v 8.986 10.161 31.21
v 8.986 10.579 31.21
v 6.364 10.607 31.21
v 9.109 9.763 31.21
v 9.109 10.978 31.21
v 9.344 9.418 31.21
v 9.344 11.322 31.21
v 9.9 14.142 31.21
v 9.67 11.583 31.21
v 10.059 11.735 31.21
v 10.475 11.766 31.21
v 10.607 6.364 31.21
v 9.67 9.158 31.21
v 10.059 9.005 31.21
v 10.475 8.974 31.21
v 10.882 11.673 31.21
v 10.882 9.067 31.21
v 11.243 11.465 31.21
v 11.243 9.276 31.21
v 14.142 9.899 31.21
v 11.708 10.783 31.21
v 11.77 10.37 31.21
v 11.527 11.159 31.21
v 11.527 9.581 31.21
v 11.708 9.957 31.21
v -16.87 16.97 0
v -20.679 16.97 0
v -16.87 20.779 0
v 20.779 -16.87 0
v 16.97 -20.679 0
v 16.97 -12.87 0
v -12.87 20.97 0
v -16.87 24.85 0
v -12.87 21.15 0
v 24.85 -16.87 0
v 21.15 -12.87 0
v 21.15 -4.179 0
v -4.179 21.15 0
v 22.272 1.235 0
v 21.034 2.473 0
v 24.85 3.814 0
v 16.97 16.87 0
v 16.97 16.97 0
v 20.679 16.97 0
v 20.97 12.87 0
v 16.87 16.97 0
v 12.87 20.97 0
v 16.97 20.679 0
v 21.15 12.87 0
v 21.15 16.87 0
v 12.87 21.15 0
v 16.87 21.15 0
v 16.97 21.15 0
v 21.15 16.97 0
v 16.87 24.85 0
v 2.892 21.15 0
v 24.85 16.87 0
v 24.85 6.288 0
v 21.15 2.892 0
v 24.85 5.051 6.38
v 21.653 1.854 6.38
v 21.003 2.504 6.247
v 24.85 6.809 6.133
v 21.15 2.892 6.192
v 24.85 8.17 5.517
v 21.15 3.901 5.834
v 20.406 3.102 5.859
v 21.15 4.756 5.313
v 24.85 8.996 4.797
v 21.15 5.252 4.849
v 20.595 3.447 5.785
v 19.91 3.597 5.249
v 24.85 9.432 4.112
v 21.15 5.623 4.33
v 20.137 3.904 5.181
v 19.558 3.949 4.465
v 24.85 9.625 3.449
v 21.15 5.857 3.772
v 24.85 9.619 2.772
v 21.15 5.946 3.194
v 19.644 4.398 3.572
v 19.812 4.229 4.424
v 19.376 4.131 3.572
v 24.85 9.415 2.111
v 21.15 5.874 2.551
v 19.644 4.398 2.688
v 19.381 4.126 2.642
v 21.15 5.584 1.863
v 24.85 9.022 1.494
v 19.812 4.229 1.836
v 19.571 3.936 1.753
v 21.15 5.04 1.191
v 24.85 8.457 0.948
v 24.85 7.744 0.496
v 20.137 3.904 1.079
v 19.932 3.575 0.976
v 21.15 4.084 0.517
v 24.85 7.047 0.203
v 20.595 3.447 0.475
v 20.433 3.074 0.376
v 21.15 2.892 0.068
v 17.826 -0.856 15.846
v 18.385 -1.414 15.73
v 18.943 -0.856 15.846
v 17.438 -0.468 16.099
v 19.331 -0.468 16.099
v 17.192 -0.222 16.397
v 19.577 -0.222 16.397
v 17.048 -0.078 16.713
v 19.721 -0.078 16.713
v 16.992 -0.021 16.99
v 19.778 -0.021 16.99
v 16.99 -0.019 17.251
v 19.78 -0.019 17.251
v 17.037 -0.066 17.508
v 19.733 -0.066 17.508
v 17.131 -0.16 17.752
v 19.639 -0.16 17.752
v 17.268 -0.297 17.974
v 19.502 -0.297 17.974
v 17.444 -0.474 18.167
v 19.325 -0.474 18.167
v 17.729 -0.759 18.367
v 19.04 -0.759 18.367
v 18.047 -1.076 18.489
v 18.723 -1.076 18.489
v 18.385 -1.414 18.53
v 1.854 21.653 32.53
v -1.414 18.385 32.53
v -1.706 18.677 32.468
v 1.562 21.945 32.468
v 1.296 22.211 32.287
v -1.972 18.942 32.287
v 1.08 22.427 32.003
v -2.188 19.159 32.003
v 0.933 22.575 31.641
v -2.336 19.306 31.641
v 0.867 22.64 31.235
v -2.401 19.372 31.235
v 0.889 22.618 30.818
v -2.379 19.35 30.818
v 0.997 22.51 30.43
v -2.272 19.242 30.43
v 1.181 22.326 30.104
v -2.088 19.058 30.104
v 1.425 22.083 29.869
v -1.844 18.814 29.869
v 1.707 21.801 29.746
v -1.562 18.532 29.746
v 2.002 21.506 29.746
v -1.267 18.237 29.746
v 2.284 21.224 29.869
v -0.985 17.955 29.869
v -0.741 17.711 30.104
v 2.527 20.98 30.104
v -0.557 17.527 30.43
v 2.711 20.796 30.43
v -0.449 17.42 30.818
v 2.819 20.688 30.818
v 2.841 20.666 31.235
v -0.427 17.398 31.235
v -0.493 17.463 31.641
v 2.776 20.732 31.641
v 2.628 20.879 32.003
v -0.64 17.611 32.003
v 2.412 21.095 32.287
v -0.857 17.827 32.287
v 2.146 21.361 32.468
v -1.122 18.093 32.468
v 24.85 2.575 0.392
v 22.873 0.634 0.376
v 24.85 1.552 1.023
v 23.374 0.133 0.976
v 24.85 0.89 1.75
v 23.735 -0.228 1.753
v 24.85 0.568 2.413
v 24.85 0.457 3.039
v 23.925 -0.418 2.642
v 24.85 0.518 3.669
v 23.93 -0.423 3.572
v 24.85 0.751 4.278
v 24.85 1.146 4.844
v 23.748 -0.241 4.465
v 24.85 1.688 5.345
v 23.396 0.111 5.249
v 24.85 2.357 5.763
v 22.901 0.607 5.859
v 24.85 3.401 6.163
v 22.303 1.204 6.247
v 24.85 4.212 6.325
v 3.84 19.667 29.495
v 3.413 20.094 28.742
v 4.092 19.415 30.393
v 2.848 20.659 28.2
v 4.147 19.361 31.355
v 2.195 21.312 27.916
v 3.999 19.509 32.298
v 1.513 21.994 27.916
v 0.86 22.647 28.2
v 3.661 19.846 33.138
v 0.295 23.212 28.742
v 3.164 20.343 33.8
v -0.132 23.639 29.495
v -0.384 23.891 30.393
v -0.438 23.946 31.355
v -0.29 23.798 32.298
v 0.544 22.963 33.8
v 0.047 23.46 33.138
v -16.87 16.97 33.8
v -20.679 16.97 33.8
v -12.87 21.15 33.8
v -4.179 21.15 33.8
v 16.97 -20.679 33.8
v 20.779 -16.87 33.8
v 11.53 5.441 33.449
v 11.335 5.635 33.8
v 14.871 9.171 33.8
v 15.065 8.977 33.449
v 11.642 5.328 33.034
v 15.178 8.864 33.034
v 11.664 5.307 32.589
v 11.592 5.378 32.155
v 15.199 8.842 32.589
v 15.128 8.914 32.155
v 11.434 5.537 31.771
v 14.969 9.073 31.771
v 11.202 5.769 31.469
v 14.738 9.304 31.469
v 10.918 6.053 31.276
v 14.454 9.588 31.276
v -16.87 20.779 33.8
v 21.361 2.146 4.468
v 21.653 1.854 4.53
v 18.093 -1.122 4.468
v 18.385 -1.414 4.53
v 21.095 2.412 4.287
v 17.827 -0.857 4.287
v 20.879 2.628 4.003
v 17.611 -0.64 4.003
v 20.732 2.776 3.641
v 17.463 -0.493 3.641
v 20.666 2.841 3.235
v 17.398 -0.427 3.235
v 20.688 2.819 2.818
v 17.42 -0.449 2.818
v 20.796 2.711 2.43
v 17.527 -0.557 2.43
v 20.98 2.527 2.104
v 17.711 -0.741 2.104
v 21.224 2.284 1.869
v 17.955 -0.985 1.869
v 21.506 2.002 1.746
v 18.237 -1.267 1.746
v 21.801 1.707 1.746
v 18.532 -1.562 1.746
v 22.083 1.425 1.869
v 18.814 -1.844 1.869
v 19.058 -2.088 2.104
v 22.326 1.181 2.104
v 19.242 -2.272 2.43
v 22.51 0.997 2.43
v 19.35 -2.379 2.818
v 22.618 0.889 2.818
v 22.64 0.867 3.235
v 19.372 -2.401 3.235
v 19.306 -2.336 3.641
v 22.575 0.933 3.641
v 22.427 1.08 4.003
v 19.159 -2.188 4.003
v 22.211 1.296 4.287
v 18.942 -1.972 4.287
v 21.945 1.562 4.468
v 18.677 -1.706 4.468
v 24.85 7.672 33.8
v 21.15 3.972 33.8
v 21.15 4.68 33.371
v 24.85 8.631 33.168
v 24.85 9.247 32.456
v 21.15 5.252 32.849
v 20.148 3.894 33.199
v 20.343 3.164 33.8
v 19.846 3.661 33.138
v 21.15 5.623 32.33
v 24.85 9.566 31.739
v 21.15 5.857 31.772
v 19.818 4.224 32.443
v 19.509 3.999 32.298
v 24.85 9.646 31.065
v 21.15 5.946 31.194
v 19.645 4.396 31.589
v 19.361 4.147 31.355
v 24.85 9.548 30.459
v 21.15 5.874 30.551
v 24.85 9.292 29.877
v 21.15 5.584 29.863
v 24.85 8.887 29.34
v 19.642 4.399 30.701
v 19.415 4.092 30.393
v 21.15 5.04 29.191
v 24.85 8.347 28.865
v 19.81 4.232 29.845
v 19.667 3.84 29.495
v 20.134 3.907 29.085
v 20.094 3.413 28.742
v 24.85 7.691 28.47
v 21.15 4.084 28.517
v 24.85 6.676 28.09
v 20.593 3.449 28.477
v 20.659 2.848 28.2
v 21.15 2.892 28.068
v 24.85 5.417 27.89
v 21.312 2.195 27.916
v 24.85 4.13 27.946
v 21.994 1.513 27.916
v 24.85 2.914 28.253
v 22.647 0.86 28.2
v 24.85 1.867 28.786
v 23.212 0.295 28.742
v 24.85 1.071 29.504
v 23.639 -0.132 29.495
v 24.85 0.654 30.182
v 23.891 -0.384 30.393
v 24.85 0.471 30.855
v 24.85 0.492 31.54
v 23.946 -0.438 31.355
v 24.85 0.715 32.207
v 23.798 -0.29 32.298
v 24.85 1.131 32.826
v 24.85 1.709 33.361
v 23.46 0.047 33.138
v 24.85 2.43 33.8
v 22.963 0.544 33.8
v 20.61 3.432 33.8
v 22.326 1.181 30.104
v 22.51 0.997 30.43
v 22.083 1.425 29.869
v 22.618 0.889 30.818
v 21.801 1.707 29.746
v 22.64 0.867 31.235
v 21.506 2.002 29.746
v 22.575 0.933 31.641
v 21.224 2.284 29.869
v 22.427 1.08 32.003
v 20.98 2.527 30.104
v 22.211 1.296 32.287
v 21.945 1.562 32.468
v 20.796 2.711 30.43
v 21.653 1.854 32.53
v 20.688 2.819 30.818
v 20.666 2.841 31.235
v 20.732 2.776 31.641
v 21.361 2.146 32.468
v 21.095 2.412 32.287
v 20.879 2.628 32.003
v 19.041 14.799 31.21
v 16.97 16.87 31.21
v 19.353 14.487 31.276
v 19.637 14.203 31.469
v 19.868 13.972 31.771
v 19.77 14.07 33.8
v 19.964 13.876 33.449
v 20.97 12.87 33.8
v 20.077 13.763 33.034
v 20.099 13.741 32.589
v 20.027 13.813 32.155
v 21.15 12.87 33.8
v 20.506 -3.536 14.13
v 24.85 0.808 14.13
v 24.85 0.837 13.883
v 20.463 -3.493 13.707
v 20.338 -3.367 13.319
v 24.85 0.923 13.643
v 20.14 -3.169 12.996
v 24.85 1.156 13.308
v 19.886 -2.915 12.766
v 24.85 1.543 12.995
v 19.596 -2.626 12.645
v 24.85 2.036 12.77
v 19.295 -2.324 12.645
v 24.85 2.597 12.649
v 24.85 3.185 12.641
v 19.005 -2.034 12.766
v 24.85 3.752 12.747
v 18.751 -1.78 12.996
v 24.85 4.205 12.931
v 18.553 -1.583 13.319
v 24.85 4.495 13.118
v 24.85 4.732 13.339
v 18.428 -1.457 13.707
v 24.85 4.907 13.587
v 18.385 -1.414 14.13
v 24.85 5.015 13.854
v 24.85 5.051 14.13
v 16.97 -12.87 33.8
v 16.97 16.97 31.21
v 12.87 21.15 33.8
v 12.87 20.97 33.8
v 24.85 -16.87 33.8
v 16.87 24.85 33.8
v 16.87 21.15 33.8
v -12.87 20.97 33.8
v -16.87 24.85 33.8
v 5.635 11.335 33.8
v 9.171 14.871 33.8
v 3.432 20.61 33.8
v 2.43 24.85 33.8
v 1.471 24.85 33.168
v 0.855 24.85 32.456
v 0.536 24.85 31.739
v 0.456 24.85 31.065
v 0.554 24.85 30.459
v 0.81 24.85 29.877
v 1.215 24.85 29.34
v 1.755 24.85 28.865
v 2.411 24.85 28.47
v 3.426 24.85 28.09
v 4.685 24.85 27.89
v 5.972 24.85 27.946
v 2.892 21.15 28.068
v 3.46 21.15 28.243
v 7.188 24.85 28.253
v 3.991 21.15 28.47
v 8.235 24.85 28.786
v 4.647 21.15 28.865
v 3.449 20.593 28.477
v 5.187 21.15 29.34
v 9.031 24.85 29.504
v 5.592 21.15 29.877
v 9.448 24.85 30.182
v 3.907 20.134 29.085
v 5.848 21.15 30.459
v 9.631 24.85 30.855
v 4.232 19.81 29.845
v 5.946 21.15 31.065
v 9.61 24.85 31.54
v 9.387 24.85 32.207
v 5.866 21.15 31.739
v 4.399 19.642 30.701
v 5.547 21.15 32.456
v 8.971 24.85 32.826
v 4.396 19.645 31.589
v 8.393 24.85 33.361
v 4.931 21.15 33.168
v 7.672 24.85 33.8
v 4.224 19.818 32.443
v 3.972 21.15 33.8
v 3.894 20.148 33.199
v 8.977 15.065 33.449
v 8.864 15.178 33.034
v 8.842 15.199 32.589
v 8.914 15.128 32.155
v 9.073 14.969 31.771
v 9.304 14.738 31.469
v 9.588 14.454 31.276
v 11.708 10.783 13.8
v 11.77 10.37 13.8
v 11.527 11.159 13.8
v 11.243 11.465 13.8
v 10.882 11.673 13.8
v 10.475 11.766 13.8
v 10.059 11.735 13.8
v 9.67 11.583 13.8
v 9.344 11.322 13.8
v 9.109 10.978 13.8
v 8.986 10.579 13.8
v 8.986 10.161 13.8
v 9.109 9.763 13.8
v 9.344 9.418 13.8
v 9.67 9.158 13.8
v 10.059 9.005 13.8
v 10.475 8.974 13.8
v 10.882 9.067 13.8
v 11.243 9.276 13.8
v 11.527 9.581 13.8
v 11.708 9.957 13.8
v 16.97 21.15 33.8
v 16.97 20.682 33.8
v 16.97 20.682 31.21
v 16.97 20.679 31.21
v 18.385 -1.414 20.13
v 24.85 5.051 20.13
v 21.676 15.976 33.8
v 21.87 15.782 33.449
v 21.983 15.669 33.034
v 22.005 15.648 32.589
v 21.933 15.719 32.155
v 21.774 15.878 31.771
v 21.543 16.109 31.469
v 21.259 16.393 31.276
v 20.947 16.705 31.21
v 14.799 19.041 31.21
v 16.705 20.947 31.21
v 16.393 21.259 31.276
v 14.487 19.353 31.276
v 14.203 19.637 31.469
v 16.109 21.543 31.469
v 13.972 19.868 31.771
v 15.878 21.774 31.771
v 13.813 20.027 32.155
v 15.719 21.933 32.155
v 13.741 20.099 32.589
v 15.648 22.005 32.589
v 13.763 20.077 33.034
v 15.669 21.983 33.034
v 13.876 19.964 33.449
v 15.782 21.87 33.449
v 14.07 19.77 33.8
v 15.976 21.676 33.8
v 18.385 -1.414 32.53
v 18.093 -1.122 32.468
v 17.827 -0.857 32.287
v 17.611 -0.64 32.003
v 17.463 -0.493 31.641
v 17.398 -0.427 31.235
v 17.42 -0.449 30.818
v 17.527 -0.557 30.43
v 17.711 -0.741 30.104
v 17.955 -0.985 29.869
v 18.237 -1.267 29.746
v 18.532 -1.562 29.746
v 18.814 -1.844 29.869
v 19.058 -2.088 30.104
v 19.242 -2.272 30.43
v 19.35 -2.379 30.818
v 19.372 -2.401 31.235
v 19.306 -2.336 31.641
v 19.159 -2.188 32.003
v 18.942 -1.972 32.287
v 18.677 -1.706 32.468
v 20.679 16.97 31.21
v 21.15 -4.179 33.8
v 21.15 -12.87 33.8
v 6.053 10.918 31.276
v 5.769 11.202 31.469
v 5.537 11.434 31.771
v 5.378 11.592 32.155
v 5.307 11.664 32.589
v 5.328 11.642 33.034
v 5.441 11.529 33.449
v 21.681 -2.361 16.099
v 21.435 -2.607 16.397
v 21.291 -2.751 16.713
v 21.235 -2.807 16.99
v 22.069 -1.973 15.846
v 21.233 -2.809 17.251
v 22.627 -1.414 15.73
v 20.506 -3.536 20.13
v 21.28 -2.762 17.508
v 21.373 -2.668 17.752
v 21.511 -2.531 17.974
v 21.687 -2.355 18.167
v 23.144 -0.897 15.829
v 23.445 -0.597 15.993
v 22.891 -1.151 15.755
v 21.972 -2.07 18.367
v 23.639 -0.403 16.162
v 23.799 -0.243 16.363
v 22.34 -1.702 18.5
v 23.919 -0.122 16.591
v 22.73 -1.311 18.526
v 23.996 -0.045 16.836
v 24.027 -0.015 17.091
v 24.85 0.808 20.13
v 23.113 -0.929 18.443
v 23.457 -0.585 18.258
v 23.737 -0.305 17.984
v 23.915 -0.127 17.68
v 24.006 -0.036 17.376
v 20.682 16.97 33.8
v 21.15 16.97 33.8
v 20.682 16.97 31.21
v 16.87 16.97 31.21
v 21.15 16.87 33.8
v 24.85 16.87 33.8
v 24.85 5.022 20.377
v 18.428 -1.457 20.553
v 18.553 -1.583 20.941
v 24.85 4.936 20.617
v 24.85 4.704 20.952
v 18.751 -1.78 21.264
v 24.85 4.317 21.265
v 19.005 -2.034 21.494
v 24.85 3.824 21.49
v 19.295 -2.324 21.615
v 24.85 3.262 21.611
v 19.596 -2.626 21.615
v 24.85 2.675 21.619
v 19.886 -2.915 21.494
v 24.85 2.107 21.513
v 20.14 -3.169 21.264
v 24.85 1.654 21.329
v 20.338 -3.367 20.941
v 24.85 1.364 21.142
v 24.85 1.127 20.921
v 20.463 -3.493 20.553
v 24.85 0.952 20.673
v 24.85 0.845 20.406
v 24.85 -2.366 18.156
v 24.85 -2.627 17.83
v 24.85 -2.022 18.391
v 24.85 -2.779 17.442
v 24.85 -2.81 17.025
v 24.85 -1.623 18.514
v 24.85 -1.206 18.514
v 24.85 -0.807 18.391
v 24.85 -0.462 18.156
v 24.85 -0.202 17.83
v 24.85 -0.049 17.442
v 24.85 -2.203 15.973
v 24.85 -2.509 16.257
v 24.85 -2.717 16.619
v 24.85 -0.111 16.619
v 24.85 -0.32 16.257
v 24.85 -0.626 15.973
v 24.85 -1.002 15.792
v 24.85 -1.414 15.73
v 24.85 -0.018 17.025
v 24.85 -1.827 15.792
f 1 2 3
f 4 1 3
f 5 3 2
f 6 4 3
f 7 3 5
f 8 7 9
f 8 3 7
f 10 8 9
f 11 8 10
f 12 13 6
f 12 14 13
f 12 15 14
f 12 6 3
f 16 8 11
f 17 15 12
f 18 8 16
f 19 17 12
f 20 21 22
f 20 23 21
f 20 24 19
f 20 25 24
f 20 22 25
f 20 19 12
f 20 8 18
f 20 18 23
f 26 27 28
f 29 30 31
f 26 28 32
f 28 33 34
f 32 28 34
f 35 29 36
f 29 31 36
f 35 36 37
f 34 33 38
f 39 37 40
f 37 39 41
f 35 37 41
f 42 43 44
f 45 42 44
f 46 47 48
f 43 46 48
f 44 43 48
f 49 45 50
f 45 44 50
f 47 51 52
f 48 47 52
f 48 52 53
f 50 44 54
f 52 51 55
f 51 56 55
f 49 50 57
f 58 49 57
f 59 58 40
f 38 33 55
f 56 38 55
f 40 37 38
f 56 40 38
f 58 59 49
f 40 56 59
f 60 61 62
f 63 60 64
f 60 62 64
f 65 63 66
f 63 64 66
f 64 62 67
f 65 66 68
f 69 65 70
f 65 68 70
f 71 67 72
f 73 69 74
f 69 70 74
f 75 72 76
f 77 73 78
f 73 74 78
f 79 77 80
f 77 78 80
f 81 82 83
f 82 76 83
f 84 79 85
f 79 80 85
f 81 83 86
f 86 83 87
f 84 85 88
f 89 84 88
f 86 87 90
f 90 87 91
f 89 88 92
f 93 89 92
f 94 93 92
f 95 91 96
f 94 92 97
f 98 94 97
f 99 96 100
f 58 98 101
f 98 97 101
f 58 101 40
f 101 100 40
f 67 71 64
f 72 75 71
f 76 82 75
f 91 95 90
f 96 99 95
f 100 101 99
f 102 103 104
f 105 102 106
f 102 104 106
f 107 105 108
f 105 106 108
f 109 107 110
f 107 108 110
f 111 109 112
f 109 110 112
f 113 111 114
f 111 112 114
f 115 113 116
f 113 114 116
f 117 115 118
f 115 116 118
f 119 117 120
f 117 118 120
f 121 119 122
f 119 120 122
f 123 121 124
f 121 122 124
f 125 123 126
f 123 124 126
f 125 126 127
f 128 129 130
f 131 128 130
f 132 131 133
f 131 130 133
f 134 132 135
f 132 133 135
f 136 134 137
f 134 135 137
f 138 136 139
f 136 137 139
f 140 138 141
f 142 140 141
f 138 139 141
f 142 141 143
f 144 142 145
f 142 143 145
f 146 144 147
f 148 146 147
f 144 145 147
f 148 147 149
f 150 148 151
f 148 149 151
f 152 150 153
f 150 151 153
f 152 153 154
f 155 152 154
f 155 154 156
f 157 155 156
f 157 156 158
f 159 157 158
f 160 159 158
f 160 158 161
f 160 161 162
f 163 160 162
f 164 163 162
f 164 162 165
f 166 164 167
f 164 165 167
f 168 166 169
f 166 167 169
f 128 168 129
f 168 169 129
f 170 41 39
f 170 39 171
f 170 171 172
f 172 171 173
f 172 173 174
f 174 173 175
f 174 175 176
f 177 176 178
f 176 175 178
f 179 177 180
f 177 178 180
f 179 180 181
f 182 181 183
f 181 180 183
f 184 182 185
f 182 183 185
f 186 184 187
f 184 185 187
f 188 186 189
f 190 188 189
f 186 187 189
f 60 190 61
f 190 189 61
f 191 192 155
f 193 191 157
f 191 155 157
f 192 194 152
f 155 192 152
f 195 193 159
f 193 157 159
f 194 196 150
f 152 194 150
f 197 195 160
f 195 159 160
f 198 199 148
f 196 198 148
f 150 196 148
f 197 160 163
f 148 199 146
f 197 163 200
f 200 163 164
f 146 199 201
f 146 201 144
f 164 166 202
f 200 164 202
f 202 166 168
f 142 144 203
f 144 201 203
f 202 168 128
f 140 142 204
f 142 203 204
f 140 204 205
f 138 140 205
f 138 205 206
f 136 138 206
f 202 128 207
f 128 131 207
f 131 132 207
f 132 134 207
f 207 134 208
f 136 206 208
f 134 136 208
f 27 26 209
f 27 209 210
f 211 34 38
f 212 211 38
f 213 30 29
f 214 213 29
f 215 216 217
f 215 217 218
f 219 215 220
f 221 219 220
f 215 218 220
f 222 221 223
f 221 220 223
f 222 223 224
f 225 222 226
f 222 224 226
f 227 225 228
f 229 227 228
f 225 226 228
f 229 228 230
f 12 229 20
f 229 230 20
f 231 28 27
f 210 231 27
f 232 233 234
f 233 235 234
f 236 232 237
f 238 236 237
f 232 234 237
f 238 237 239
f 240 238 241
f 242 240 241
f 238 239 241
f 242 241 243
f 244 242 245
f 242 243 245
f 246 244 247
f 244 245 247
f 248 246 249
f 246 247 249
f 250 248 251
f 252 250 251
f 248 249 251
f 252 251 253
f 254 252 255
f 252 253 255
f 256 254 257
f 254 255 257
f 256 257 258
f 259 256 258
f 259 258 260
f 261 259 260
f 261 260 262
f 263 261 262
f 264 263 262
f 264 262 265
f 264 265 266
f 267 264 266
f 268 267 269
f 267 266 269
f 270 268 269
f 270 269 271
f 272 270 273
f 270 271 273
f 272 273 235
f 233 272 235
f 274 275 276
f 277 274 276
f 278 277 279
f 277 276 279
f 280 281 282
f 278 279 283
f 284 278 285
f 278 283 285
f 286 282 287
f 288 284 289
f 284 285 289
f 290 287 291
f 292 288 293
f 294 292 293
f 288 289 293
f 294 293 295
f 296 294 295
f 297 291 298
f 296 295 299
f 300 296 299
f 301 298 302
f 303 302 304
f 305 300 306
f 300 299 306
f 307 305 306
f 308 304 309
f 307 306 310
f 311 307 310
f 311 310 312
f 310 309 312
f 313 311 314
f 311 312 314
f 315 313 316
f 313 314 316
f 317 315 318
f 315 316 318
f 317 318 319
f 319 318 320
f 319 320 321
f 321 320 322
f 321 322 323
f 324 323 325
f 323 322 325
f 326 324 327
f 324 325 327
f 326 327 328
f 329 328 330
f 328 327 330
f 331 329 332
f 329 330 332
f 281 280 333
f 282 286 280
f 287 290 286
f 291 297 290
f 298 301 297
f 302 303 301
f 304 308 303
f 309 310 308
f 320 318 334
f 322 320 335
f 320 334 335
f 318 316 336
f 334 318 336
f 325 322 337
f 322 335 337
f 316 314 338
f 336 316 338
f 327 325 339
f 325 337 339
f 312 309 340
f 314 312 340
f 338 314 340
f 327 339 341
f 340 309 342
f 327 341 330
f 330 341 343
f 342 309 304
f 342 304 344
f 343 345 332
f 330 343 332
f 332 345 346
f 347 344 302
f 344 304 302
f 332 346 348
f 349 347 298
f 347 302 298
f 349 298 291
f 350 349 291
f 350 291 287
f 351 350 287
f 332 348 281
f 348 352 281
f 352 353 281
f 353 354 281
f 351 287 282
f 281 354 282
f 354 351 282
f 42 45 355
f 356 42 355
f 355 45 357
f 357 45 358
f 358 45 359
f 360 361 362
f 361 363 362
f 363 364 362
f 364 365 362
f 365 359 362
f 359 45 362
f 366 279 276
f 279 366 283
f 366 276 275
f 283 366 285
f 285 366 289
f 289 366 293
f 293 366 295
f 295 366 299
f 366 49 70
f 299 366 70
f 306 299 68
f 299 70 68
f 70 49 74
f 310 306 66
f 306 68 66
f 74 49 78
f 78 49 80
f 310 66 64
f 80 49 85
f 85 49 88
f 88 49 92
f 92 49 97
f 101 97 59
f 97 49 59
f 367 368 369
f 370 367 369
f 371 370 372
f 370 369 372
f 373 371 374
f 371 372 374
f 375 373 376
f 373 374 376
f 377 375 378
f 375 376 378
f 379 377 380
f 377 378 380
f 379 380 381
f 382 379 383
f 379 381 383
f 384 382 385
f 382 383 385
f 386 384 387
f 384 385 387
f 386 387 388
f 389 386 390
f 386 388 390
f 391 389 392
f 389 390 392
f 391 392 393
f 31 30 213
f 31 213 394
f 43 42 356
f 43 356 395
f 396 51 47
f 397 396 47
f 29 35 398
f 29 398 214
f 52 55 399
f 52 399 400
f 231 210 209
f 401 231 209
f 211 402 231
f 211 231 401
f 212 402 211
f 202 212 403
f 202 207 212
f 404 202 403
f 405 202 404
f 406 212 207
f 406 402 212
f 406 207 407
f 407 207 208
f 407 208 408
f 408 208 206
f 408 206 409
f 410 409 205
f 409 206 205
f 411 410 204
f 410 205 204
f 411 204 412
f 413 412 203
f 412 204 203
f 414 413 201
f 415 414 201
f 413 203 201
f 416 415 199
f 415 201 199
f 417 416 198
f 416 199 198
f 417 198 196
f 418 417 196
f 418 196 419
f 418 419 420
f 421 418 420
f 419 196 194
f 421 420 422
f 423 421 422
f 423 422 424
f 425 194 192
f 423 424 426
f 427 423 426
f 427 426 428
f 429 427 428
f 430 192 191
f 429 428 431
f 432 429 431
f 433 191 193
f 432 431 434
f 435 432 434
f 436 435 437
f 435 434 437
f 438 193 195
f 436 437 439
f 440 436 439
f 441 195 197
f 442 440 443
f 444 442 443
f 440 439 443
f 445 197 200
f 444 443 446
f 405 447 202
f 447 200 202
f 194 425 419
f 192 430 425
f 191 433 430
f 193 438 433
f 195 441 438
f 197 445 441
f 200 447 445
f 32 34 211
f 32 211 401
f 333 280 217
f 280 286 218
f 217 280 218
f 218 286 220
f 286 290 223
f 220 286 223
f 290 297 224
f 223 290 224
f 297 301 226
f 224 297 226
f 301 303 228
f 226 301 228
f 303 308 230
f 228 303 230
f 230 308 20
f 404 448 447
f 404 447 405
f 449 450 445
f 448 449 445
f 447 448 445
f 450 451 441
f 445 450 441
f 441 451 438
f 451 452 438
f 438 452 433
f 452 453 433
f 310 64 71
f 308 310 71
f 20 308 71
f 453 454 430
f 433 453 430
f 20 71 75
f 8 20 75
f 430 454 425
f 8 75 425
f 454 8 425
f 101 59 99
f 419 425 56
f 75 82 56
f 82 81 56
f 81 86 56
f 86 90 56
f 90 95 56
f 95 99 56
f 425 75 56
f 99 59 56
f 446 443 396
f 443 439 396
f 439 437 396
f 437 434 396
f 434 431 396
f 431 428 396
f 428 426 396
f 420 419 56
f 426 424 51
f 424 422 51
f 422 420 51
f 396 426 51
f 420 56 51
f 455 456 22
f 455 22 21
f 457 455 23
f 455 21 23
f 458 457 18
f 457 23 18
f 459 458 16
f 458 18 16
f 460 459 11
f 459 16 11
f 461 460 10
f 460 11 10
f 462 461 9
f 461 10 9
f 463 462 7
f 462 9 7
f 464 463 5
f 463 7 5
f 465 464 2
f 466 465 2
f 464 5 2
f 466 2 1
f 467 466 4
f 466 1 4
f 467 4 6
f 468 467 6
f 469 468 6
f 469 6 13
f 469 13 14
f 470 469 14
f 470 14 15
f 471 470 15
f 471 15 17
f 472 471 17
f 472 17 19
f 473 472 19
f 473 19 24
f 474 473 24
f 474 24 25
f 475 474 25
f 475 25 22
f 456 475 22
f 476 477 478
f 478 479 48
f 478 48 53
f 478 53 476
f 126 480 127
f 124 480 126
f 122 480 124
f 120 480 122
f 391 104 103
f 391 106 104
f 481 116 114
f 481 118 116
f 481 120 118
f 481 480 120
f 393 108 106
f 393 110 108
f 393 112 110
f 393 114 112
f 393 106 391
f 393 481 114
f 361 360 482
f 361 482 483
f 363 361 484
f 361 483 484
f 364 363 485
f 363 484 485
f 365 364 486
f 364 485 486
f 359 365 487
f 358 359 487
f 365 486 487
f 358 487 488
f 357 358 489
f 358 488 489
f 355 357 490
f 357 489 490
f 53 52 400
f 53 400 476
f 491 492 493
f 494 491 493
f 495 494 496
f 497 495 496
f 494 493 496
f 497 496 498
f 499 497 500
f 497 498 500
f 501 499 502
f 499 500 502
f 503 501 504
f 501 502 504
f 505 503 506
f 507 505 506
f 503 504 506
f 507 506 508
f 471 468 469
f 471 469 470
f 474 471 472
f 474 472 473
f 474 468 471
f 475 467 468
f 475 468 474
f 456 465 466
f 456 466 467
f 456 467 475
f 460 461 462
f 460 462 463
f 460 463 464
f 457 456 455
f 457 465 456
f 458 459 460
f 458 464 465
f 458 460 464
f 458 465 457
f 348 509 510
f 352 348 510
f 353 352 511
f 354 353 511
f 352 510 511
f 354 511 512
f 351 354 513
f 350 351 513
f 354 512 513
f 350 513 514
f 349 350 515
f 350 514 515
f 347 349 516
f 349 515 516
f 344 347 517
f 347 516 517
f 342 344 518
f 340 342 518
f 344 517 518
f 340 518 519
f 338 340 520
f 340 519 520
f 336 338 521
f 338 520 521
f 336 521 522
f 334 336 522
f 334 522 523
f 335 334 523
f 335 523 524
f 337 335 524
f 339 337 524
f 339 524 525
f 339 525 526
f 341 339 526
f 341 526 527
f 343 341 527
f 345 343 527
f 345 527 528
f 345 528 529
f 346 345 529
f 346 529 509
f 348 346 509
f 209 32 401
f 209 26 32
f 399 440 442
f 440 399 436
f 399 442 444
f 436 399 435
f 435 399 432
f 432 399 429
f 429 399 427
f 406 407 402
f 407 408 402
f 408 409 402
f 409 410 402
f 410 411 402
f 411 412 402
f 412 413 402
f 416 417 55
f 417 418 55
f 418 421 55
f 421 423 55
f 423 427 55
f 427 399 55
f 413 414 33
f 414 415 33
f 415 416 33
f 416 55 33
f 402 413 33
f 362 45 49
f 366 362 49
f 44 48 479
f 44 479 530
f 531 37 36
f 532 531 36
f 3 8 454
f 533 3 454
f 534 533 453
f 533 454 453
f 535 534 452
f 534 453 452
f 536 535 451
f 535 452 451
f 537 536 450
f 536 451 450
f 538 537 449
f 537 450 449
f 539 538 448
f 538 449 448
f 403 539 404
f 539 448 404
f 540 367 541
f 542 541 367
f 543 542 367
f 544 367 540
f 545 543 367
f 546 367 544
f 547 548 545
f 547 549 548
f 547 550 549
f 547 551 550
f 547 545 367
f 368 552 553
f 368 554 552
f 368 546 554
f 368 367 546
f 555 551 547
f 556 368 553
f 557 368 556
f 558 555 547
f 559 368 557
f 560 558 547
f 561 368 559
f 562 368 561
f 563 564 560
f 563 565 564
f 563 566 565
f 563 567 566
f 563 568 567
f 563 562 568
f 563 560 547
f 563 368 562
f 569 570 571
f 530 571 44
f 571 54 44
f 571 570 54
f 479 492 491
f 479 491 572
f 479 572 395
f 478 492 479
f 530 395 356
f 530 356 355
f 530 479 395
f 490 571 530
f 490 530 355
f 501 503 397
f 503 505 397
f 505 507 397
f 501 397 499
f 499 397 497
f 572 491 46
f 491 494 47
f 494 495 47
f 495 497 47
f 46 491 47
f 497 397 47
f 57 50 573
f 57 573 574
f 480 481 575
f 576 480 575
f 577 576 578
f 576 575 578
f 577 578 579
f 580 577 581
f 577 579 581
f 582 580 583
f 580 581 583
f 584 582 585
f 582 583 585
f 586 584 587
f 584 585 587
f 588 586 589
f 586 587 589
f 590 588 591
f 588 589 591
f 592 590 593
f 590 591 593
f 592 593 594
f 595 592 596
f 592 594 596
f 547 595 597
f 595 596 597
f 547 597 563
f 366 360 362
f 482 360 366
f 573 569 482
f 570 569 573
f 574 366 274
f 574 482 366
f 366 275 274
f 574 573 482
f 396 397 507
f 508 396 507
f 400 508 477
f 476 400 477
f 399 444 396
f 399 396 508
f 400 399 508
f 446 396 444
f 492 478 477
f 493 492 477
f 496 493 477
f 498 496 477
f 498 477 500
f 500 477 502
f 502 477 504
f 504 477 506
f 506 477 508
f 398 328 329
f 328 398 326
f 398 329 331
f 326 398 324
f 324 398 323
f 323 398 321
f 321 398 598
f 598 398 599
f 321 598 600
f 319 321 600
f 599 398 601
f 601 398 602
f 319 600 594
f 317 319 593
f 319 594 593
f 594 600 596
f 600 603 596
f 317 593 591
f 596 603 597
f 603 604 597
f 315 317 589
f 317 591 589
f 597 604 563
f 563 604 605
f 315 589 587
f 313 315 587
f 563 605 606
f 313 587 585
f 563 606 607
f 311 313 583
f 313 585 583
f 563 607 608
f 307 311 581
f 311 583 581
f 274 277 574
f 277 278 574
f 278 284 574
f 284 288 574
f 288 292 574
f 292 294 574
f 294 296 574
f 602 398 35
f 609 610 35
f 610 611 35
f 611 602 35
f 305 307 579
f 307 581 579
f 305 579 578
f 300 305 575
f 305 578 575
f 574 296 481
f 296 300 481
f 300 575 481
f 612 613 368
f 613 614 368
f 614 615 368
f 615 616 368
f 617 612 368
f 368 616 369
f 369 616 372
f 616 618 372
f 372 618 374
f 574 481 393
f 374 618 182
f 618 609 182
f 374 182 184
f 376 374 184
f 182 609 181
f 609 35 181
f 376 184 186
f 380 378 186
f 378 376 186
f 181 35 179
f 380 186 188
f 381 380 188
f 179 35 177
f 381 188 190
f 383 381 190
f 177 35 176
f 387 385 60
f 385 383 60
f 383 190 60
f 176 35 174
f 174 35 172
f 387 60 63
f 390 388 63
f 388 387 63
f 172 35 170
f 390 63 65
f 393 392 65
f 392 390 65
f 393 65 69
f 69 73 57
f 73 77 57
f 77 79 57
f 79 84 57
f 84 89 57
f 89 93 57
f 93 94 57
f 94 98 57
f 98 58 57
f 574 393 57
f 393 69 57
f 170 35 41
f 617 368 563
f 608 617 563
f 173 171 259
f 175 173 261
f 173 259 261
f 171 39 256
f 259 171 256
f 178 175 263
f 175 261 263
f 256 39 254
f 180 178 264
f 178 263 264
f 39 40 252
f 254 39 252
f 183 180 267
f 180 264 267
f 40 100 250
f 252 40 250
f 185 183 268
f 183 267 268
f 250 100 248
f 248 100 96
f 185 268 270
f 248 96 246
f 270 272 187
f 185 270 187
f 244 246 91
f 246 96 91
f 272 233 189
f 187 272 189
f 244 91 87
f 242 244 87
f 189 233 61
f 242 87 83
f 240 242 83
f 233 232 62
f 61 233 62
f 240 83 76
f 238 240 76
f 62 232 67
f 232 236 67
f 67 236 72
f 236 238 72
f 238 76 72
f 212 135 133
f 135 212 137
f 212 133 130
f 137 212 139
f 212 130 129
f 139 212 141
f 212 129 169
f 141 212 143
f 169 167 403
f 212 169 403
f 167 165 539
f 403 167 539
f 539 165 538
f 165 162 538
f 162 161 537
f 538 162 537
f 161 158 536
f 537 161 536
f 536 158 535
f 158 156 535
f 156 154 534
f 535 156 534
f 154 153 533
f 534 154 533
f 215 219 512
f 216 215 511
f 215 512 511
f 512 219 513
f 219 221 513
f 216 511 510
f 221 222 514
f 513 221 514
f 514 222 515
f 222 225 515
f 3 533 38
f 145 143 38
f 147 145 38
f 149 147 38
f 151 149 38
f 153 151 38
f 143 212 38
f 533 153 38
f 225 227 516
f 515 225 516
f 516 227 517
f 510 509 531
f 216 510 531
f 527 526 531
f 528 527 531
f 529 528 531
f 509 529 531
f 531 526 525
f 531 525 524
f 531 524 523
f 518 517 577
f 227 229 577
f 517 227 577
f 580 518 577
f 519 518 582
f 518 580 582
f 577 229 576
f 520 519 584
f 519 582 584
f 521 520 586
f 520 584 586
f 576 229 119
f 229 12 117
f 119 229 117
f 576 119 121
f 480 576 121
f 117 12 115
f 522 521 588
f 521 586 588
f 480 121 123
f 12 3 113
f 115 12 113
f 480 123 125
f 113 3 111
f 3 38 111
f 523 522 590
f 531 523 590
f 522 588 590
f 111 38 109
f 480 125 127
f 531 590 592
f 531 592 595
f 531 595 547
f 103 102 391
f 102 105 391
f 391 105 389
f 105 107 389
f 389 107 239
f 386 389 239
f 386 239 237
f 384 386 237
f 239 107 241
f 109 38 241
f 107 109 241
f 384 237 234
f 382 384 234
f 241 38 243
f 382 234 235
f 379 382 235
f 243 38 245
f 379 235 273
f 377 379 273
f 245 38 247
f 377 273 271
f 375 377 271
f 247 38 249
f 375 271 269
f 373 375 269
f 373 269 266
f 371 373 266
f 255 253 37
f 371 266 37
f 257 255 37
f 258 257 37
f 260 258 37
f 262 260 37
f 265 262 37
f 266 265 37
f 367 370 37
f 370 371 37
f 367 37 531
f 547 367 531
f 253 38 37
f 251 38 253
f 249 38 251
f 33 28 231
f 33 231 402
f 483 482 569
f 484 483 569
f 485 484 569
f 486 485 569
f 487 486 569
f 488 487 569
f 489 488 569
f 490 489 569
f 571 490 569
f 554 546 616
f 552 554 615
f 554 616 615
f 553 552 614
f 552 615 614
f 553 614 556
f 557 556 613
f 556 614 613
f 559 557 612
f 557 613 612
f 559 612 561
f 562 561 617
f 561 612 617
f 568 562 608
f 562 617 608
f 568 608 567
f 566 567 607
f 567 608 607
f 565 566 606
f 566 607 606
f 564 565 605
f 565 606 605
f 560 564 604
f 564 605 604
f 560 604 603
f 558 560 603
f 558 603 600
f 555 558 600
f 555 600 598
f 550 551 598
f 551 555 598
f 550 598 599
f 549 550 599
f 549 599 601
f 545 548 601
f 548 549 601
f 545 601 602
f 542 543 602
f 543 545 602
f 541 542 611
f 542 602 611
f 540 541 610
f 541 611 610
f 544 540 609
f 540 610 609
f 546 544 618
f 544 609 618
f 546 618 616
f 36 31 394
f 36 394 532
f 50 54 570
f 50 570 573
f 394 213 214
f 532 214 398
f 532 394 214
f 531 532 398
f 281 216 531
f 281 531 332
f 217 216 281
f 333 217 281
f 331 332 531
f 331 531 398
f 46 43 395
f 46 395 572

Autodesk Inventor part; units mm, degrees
ref_plane "YZ Plane" through (0, 0, 0) normal (1, 0, 0) x (0, 1, 0)
ref_plane "XZ Plane" through (0, 0, 0) normal (0, 1, 0) x (-1, 0, 0)
ref_plane "XY Plane" through (0, 0, 0) normal (0, 0, 1) x (1, 0, 0)
ref_plane "Arbeitsebene1" through (0, 0, 0) normal (0, 0, 1) x (1, 0, 0)
sketch "Skizze1" plane through (0, 0, 0) normal (0, 0, 1) x (1, 0, 0)
  arc A0 (24.85, 22.85) -> (22.85, 24.85) centre (22.85, 22.85) ccw projected
  line L0 (22.85, 24.85) -> (-16.97, 24.85) projected
  line L1 (-16.97, 24.85) -> (-16.97, 21.15) projected
  line L2 (-16.97, 21.15) -> (16.97, 21.15) projected
  line L3 (16.97, 16.97) -> (16.97, 21.15) projected
  line L4 (21.15, 16.97) -> (16.97, 16.97) projected
  line L5 (21.15, 16.97) -> (21.15, -16.97) projected
  line L6 (21.15, -16.97) -> (24.85, -16.97) projected
  line L7 (24.85, -16.97) -> (24.85, 22.85) projected
  line L8 (23.75, 23.25) -> (23.75, 18.15) projected
  arc A1 (23.25, 17.65) -> (23.75, 18.15) centre (23.25, 18.15) ccw projected
  line L9 (23.25, 17.65) -> (20.8937, 17.65) projected
  arc A2 (20.5239, 17.8134) -> (20.8937, 17.65) centre (20.8937, 18.15) ccw projected
  line L10 (20.5239, 17.8134) -> (17.7803, 20.8273) projected
  arc A3 (17.65, 21.1639) -> (17.7803, 20.8273) centre (18.15, 21.1639) ccw projected
  line L11 (17.65, 21.1639) -> (17.65, 23.25) projected
  arc A4 (18.15, 23.75) -> (17.65, 23.25) centre (18.15, 23.25) ccw projected
  line L12 (18.15, 23.75) -> (23.25, 23.75) projected
  arc A5 (23.75, 23.25) -> (23.25, 23.75) centre (23.25, 23.25) ccw projected
  line L13 (-16.87, 24.85) -> (16.87, 24.85)
  line L14 (16.87, 24.85) -> (16.87, 21.85)
  line L15 (16.87, 21.85) -> (-16.87, 21.85)
  line L16 (-16.87, 21.85) -> (-16.87, 24.85)
  line L17 (34.79, 34.79) -> (-34.79, -34.79)
  line L18 (16.87, 21.85) -> (16.87, 16.87)
  line L19 (12.87, 21.85) -> (12.87, 12.87)
  line L20 (16.87, 16.87) -> (12.87, 12.87)
  line L21 (-16.97, 21.15) -> (-16.97, 16.97) projected
  line L22 (16.97, 16.97) -> (-16.97, 16.97) projected
  line L23 (16.97, 21.15) -> (16.97, 16.97) projected
  line L24 (-16.97, 21.15) -> (16.97, 21.15) projected
  line L25 (-16.97, 16.97) -> (-16.97, 20.75) projected
  line L26 (-20.75, 16.97) -> (-16.97, 20.75) projected
  line L27 (-20.75, 16.97) -> (-16.97, 16.97) projected
  line L28 (-16.87, 21.85) -> (-12.87, 21.85)
  line L29 (-12.87, 21.85) -> (-12.87, 16.97)
  line L30 (-12.87, 16.97) -> (-16.87, 16.97)
  line L31 (-16.87, 16.97) -> (-16.87, 21.85)
  line L32 (-16.87, 20.7793) -> (-20.6793, 16.97)
  line L33 (-20.6793, 16.97) -> (-16.87, 16.97)
  line L34 (-4.8794, 21.85) -> (21.15, -4.1794)
  line L35 (-7.0711, 15.5563) -> (3.471, 5.0143) projected
  line L36 (21.15, 2.8916) -> (2.1916, 21.85)
  line L37 (12.0208, 12.0208) -> (8.4853, 8.4853)
  line L38 (20.75, 16.97) -> (16.97, 20.75) projected
  line L39 (16.97, 20.6793) -> (20.6793, 16.97)
  point P0 (0, 0)
  point P1 (-12.87, 21.15)
  point P2 (12.87, 21.15)
  point P3 (2.8916, 21.15)
  point P4 (-4.1794, 21.15)
  point P5 (12.87, 16.97)
  point P6 (16.87, 21.15)
  dimension "d0" = 0.1
  dimension "d1" = 0.1
  dimension "d2" = 3
  dimension "d3" = 4
  dimension "d6" = 4
  dimension "d8" = 0
  dimension "d9" = 0.05
  dimension "d10" = 6
  dimension "d11" = 5
  dimension "d12" = 0.05
extrude "Extrusion1" add sketch "Skizze1" along normal blind 33.8 contours L14 L15 L16 L0 | L18 L2 L19 L15 | L34 L22 L36 L17 | L15 L29 L2 L31 | L19 L2 L36 L15 | L18 L22 L19 L2 | L2 L3 L22 L18 | L39 L4 L17 | L17 L3 L39 | L34 L2 L36 L22 | L15 L34 L2 L29 | L2 L29 L22 L31 | L36 L2 L34 L15 | L31 L22 L21 L32 | L21 L27 L32
mirror "Spiegeln1" about plane through (8.4853, 8.4853, 0) normal (0.7071, -0.7071, 0) of "Extrusion1"
chamfer "Fase1" distance 4 angle 45 3 edges at (12.87, 16.97, 16.9) (16.97, 12.87, 16.9) (-12.87, 16.97, 16.9)
ref_plane "Arbeitsebene2" through (21.9197, 25.629, 0) normal (0.7071, 0.7071, 0) x (-0.7071, 0.7071, 0)
sketch "Skizze2" plane through (21.9197, 25.629, 0) normal (0.7071, 0.7071, 0) x (-0.7071, 0.7071, 0)
  line L0 (-16.6229, 20.13) -> (-16.6229, 14.13) projected
  arc A0 (-19.6229, 14.13) -> (-16.6229, 14.13) centre (-18.1229, 14.13) ccw projected
  line L1 (-19.6229, 14.13) -> (-19.6229, 20.13) projected
  arc A1 (-16.6229, 20.13) -> (-19.6229, 20.13) centre (-18.1229, 20.13) ccw projected
  line L2 (0.3771, 31.21) -> (-5.6229, 31.21) projected
  arc A2 (-5.6229, 34.21) -> (-5.6229, 31.21) centre (-5.6229, 32.71) ccw projected
  line L3 (-5.6229, 34.21) -> (0.3771, 34.21) projected
  arc A3 (0.3771, 31.21) -> (0.3771, 34.21) centre (0.3771, 32.71) ccw projected
  circle A4 centre (-16.6229, 31.13) radius 3.25 projected
  circle A5 centre (-2.6229, 17.13) radius 3.25 projected
  circle A6 centre (11.3771, 31.13) radius 3.25 projected
  circle A7 centre (-16.6229, 3.13) radius 3.25 projected
  line L4 (14.3357, 42.03) -> (-19.6229, 42.03) projected
  line L5 (-19.6229, 42.03) -> (-19.6229, 38.4552) projected
  line L6 (-19.6229, 38.4552) -> (-23.9481, 34.13) projected
  line L7 (-23.9481, 34.13) -> (-27.5229, 34.13) projected
  line L8 (-27.5229, 34.13) -> (-27.5229, 0.13) projected
  line L9 (-27.5229, 0.13) -> (-23.9481, 0.13) projected
  line L10 (-23.9481, 0.13) -> (-19.6229, -4.1952) projected
  line L11 (-19.6229, -4.1952) -> (-19.6229, -7.77) projected
  line L12 (-19.6229, -7.77) -> (14.3771, -7.77) projected
  line L13 (14.3771, -7.77) -> (14.3771, -4.1952) projected
  line L14 (14.3771, -4.1952) -> (18.7023, 0.13) projected
  line L15 (18.7023, 0.13) -> (22.2771, 0.13) projected
  line L16 (22.2771, 0.13) -> (22.2771, 34.13) projected
  line L17 (22.2771, 34.13) -> (18.7023, 34.13) projected
  line L18 (18.7023, 34.13) -> (14.3357, 38.4966) projected
  line L19 (14.3357, 38.4966) -> (14.3357, 42.03) projected
  point P0 (-2.6229, 0)
hole "Bohrung1" at (13.8749, 33.6739, 31.13) at (33.6739, 13.8749, 31.13) at (33.6739, 13.8749, 3.13) direction (-0.7071, -0.7071, 0) diameter 2.8 depth 30 tip angle 118 counterbore diameter 6.5 counterbore depth 17
sketch "Skizze3" plane through (16.97, 20.6793, 0) normal (0.7071, 0.7071, 0) x (-0.7071, 0.7071, 0)
  line L0 (-16.6229, 20.13) -> (-16.6229, 14.13) projected
  arc A0 (-19.6229, 14.13) -> (-16.6229, 14.13) centre (-18.1229, 14.13) ccw projected
  line L1 (-19.6229, 14.13) -> (-19.6229, 20.13) projected
  arc A1 (-16.6229, 20.13) -> (-19.6229, 20.13) centre (-18.1229, 20.13) ccw projected
  line L2 (0.3771, 31.21) -> (-5.6229, 31.21) projected
  arc A2 (-5.6229, 34.21) -> (-5.6229, 31.21) centre (-5.6229, 32.71) ccw projected
  line L3 (-5.6229, 34.21) -> (0.3771, 34.21) projected
  arc A3 (0.3771, 31.21) -> (0.3771, 34.21) centre (0.3771, 32.71) ccw projected
  circle A4 centre (-16.6229, 31.13) radius 3.25 projected
  circle A5 centre (-2.6229, 17.13) radius 3.25 projected
  circle A6 centre (11.3771, 31.13) radius 3.25 projected
  circle A7 centre (-16.6229, 3.13) radius 3.25 projected
  line L4 (14.3357, 42.03) -> (-19.6229, 42.03) projected
  line L5 (-19.6229, 42.03) -> (-19.6229, 38.4552) projected
  line L6 (-19.6229, 38.4552) -> (-23.9481, 34.13) projected
  line L7 (-23.9481, 34.13) -> (-27.5229, 34.13) projected
  line L8 (-27.5229, 34.13) -> (-27.5229, 0.13) projected
  line L9 (-27.5229, 0.13) -> (-23.9481, 0.13) projected
  line L10 (-23.9481, 0.13) -> (-19.6229, -4.1952) projected
  line L11 (-19.6229, -4.1952) -> (-19.6229, -7.77) projected
  line L12 (-19.6229, -7.77) -> (14.3771, -7.77) projected
  line L13 (14.3771, -7.77) -> (14.3771, -4.1952) projected
  line L14 (14.3771, -4.1952) -> (18.7023, 0.13) projected
  line L15 (18.7023, 0.13) -> (22.2771, 0.13) projected
  line L16 (22.2771, 0.13) -> (22.2771, 34.13) projected
  line L17 (22.2771, 34.13) -> (18.7023, 34.13) projected
  line L18 (18.7023, 34.13) -> (14.3357, 38.4966) projected
  line L19 (14.3357, 38.4966) -> (14.3357, 42.03) projected
  point P0 (-2.6229, 0)
extrude "Extrusion2" cut sketch "Skizze3" against normal blind 33.8 contours L0 A0 L1 A1 | L2 A2 L3 A3
sketch "Skizze4" plane through (0, 0, 33.8) normal (0, 0, 1) x (1, 0, 0)
  line L0 (10.6066, 6.364) -> (6.364, 10.6066) projected
  line L1 (14.1421, 9.8995) -> (10.6066, 6.364) projected
  line L2 (9.8995, 14.1421) -> (14.1421, 9.8995) projected
  line L3 (9.8995, 14.1421) -> (6.364, 10.6066) projected
  circle A0 centre (10.3701, 10.3701) radius 1.4
  point P0 (0, 0)
  dimension "d26" = 2.8
extrude "Extrusion3" cut sketch "Skizze4" against normal blind 20 contours A0
sketch "Skizze5" plane through (24.85, -16.87, 33.8) normal (1, 0, 0) x (0, 0, -1)
  ellipse E0 centre (13.67, 19.7997) end of major axis (13.67, 21.921) minor radius 1.5 (13.67, 21.921) -> (13.67, 17.6784) ccw projected
  line L0 (13.67, 21.921) -> (19.67, 21.921) projected
  ellipse E1 centre (19.67, 19.7997) end of major axis (19.67, 17.6784) minor radius 1.5 (19.67, 17.6784) -> (19.67, 21.921) ccw projected
  line L1 (19.67, 17.6784) -> (13.67, 17.6784) projected
  ellipse E2 centre (2.67, 21.921) end of major axis (2.67, 26.5172) minor radius 3.25 (0, 19.3005) -> (0, 24.5415) ccw projected
  line L2 (0, 19.3005) -> (0, 0) projected
  line L3 (33.8, 0) -> (0, 0) projected
  line L4 (33.8, 20.6836) -> (33.8, 0) projected
  ellipse E3 centre (30.67, 21.921) end of major axis (30.67, 26.5172) minor radius 3.25 (33.8, 23.1584) -> (33.8, 20.6836) ccw projected
  line L5 (33.8, 33.74) -> (33.8, 23.1584) projected
  line L6 (33.8, 33.74) -> (0, 33.74) projected
  line L7 (0, 33.74) -> (0, 24.5415) projected
  line L8 (19.67, 15.4558) -> (13.67, 15.4558) projected
  circle A0 centre (16.67, 15.4558) radius 1.4
  point P0 (33.8, 16.87)
  dimension "d29" = 2.8
extrude "Extrusion4" cut sketch "Skizze5" against normal blind 20 contours A0 L8 | L8 A0
properties part number "20_Cube_Insert_Kinematic_Mirror_45_pro_v3"
